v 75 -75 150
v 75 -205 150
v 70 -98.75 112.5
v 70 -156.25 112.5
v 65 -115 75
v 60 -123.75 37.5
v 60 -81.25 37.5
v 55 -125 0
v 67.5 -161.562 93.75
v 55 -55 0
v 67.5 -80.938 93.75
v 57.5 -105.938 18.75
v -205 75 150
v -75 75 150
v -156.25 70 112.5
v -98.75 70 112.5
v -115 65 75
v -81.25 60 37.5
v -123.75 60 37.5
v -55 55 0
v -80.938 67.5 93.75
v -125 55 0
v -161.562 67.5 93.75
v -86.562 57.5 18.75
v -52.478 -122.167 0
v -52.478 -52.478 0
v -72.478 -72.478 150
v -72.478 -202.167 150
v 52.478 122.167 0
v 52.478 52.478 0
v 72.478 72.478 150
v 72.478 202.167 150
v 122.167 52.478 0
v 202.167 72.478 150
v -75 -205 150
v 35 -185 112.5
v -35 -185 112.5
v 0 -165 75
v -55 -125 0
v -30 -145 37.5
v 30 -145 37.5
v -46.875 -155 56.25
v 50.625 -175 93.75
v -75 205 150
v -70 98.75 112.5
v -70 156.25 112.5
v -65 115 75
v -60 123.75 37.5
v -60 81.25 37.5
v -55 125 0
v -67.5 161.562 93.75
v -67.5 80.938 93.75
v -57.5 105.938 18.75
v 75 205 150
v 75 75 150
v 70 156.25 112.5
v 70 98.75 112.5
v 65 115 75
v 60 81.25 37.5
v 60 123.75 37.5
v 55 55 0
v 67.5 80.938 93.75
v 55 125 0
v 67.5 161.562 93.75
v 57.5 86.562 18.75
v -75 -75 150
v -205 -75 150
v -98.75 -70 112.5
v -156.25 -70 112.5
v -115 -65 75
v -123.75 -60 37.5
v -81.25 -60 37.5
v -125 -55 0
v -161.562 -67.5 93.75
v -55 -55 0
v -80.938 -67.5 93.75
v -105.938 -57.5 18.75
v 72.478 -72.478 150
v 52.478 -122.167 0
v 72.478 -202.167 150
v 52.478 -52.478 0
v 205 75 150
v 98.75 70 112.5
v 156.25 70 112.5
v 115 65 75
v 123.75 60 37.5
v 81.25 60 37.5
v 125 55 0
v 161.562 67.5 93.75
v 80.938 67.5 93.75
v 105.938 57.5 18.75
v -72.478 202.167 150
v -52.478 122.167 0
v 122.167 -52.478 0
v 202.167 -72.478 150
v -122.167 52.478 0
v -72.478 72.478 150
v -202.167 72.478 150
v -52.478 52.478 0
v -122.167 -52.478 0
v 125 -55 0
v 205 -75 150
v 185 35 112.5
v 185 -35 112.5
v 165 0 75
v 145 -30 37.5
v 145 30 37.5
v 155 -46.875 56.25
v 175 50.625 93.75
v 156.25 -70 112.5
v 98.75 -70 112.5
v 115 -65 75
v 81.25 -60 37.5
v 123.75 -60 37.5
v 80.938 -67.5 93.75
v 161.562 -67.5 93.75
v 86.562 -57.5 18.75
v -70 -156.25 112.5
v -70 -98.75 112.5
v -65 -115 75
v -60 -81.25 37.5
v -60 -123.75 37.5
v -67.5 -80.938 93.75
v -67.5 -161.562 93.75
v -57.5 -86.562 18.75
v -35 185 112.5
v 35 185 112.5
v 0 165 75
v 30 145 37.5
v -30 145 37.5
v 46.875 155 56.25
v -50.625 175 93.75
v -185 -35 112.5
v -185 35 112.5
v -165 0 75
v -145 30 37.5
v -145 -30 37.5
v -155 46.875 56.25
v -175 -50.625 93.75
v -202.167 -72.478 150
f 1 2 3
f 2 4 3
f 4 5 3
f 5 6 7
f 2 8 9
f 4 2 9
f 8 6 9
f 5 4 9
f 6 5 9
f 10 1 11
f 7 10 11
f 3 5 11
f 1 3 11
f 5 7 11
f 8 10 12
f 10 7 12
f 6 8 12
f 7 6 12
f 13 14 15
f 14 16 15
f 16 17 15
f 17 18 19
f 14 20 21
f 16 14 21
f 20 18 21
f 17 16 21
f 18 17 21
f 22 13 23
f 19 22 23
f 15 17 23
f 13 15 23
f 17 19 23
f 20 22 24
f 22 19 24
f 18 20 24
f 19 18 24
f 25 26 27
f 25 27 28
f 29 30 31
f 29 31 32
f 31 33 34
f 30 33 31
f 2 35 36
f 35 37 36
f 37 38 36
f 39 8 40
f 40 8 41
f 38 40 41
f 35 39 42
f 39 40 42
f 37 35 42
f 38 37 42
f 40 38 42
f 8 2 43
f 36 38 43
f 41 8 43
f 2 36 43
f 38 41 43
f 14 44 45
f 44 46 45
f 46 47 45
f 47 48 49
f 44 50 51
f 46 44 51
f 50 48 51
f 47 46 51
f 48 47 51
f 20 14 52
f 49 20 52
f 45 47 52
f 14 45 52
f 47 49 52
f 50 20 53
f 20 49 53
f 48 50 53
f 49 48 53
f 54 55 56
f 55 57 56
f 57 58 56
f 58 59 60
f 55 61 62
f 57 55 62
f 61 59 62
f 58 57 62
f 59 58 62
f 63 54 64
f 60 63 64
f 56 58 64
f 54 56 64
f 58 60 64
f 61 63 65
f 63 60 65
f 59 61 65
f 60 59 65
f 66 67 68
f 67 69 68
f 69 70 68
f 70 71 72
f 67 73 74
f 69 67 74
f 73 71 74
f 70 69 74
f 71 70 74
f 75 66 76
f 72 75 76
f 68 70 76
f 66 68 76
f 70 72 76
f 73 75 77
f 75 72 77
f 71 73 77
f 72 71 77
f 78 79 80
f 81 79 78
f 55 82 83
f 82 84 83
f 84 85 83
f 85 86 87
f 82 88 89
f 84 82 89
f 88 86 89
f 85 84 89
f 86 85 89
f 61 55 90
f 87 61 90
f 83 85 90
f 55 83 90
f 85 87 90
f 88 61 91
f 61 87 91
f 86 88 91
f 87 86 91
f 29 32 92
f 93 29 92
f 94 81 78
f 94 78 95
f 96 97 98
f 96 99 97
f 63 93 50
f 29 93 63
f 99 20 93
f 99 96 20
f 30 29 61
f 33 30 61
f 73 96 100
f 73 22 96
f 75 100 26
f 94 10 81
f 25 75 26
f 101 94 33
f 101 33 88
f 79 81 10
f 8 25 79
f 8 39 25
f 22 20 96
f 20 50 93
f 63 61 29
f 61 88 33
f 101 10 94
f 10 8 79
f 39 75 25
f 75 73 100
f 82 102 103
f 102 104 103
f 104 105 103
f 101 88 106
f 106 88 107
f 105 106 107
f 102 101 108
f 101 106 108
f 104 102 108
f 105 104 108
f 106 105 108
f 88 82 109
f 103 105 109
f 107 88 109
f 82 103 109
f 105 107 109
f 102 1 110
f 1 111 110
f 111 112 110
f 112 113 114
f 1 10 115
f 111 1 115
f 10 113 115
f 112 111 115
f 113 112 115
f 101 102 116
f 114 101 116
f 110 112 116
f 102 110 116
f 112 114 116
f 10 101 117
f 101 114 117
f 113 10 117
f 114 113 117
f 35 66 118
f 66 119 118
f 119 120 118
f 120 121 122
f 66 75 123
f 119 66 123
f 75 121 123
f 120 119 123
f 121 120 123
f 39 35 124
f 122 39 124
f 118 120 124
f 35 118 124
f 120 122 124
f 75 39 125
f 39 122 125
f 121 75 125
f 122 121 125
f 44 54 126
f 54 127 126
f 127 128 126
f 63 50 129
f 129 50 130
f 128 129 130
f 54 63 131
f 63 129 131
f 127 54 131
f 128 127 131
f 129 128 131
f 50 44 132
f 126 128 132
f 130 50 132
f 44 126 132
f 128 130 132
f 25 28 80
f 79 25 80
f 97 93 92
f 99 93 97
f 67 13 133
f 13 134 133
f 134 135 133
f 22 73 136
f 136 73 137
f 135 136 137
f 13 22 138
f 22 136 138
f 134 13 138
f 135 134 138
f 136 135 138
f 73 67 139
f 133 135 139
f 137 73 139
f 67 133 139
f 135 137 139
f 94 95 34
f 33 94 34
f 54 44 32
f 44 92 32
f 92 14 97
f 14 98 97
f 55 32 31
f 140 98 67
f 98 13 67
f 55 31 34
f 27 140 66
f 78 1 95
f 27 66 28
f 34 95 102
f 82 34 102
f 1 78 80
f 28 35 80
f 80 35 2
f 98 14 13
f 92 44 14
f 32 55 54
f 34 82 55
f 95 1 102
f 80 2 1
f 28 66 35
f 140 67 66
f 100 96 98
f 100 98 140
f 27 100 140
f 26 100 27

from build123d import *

# Parameters (mm, degrees)
F4_T = -2.5


with BuildPart() as f3:
    # F2 (on offset) → F3 section 0
    with BuildSketch(Plane.XY.offset(150)):
        Polygon((-205, 75), (-205, -75), (-75, -75), (-75, -205), (75, -205), (75, -75), (205, -75), (205, 75), (75, 75), (75, 205), (-75, 205), (-75, 75), align=None)
    # F0 (on Top) → F3 section 1
    with BuildSketch(Plane.XY):
        Polygon((55, 125), (-55, 125), (-55, 55), (-125, 55), (-125, -55), (-55, -55), (-55, -125), (55, -125), (55, -55), (125, -55), (125, 55), (55, 55), align=None)
    loft()

    # F4
    f4_openings = [f3.faces().sort_by_distance(p)[0] for p in [
        (0, 0, 150),
        (0, 0, 0),
    ]]
    offset(amount=F4_T, openings=f4_openings, kind=Kind.INTERSECTION)


solid = f3.part
